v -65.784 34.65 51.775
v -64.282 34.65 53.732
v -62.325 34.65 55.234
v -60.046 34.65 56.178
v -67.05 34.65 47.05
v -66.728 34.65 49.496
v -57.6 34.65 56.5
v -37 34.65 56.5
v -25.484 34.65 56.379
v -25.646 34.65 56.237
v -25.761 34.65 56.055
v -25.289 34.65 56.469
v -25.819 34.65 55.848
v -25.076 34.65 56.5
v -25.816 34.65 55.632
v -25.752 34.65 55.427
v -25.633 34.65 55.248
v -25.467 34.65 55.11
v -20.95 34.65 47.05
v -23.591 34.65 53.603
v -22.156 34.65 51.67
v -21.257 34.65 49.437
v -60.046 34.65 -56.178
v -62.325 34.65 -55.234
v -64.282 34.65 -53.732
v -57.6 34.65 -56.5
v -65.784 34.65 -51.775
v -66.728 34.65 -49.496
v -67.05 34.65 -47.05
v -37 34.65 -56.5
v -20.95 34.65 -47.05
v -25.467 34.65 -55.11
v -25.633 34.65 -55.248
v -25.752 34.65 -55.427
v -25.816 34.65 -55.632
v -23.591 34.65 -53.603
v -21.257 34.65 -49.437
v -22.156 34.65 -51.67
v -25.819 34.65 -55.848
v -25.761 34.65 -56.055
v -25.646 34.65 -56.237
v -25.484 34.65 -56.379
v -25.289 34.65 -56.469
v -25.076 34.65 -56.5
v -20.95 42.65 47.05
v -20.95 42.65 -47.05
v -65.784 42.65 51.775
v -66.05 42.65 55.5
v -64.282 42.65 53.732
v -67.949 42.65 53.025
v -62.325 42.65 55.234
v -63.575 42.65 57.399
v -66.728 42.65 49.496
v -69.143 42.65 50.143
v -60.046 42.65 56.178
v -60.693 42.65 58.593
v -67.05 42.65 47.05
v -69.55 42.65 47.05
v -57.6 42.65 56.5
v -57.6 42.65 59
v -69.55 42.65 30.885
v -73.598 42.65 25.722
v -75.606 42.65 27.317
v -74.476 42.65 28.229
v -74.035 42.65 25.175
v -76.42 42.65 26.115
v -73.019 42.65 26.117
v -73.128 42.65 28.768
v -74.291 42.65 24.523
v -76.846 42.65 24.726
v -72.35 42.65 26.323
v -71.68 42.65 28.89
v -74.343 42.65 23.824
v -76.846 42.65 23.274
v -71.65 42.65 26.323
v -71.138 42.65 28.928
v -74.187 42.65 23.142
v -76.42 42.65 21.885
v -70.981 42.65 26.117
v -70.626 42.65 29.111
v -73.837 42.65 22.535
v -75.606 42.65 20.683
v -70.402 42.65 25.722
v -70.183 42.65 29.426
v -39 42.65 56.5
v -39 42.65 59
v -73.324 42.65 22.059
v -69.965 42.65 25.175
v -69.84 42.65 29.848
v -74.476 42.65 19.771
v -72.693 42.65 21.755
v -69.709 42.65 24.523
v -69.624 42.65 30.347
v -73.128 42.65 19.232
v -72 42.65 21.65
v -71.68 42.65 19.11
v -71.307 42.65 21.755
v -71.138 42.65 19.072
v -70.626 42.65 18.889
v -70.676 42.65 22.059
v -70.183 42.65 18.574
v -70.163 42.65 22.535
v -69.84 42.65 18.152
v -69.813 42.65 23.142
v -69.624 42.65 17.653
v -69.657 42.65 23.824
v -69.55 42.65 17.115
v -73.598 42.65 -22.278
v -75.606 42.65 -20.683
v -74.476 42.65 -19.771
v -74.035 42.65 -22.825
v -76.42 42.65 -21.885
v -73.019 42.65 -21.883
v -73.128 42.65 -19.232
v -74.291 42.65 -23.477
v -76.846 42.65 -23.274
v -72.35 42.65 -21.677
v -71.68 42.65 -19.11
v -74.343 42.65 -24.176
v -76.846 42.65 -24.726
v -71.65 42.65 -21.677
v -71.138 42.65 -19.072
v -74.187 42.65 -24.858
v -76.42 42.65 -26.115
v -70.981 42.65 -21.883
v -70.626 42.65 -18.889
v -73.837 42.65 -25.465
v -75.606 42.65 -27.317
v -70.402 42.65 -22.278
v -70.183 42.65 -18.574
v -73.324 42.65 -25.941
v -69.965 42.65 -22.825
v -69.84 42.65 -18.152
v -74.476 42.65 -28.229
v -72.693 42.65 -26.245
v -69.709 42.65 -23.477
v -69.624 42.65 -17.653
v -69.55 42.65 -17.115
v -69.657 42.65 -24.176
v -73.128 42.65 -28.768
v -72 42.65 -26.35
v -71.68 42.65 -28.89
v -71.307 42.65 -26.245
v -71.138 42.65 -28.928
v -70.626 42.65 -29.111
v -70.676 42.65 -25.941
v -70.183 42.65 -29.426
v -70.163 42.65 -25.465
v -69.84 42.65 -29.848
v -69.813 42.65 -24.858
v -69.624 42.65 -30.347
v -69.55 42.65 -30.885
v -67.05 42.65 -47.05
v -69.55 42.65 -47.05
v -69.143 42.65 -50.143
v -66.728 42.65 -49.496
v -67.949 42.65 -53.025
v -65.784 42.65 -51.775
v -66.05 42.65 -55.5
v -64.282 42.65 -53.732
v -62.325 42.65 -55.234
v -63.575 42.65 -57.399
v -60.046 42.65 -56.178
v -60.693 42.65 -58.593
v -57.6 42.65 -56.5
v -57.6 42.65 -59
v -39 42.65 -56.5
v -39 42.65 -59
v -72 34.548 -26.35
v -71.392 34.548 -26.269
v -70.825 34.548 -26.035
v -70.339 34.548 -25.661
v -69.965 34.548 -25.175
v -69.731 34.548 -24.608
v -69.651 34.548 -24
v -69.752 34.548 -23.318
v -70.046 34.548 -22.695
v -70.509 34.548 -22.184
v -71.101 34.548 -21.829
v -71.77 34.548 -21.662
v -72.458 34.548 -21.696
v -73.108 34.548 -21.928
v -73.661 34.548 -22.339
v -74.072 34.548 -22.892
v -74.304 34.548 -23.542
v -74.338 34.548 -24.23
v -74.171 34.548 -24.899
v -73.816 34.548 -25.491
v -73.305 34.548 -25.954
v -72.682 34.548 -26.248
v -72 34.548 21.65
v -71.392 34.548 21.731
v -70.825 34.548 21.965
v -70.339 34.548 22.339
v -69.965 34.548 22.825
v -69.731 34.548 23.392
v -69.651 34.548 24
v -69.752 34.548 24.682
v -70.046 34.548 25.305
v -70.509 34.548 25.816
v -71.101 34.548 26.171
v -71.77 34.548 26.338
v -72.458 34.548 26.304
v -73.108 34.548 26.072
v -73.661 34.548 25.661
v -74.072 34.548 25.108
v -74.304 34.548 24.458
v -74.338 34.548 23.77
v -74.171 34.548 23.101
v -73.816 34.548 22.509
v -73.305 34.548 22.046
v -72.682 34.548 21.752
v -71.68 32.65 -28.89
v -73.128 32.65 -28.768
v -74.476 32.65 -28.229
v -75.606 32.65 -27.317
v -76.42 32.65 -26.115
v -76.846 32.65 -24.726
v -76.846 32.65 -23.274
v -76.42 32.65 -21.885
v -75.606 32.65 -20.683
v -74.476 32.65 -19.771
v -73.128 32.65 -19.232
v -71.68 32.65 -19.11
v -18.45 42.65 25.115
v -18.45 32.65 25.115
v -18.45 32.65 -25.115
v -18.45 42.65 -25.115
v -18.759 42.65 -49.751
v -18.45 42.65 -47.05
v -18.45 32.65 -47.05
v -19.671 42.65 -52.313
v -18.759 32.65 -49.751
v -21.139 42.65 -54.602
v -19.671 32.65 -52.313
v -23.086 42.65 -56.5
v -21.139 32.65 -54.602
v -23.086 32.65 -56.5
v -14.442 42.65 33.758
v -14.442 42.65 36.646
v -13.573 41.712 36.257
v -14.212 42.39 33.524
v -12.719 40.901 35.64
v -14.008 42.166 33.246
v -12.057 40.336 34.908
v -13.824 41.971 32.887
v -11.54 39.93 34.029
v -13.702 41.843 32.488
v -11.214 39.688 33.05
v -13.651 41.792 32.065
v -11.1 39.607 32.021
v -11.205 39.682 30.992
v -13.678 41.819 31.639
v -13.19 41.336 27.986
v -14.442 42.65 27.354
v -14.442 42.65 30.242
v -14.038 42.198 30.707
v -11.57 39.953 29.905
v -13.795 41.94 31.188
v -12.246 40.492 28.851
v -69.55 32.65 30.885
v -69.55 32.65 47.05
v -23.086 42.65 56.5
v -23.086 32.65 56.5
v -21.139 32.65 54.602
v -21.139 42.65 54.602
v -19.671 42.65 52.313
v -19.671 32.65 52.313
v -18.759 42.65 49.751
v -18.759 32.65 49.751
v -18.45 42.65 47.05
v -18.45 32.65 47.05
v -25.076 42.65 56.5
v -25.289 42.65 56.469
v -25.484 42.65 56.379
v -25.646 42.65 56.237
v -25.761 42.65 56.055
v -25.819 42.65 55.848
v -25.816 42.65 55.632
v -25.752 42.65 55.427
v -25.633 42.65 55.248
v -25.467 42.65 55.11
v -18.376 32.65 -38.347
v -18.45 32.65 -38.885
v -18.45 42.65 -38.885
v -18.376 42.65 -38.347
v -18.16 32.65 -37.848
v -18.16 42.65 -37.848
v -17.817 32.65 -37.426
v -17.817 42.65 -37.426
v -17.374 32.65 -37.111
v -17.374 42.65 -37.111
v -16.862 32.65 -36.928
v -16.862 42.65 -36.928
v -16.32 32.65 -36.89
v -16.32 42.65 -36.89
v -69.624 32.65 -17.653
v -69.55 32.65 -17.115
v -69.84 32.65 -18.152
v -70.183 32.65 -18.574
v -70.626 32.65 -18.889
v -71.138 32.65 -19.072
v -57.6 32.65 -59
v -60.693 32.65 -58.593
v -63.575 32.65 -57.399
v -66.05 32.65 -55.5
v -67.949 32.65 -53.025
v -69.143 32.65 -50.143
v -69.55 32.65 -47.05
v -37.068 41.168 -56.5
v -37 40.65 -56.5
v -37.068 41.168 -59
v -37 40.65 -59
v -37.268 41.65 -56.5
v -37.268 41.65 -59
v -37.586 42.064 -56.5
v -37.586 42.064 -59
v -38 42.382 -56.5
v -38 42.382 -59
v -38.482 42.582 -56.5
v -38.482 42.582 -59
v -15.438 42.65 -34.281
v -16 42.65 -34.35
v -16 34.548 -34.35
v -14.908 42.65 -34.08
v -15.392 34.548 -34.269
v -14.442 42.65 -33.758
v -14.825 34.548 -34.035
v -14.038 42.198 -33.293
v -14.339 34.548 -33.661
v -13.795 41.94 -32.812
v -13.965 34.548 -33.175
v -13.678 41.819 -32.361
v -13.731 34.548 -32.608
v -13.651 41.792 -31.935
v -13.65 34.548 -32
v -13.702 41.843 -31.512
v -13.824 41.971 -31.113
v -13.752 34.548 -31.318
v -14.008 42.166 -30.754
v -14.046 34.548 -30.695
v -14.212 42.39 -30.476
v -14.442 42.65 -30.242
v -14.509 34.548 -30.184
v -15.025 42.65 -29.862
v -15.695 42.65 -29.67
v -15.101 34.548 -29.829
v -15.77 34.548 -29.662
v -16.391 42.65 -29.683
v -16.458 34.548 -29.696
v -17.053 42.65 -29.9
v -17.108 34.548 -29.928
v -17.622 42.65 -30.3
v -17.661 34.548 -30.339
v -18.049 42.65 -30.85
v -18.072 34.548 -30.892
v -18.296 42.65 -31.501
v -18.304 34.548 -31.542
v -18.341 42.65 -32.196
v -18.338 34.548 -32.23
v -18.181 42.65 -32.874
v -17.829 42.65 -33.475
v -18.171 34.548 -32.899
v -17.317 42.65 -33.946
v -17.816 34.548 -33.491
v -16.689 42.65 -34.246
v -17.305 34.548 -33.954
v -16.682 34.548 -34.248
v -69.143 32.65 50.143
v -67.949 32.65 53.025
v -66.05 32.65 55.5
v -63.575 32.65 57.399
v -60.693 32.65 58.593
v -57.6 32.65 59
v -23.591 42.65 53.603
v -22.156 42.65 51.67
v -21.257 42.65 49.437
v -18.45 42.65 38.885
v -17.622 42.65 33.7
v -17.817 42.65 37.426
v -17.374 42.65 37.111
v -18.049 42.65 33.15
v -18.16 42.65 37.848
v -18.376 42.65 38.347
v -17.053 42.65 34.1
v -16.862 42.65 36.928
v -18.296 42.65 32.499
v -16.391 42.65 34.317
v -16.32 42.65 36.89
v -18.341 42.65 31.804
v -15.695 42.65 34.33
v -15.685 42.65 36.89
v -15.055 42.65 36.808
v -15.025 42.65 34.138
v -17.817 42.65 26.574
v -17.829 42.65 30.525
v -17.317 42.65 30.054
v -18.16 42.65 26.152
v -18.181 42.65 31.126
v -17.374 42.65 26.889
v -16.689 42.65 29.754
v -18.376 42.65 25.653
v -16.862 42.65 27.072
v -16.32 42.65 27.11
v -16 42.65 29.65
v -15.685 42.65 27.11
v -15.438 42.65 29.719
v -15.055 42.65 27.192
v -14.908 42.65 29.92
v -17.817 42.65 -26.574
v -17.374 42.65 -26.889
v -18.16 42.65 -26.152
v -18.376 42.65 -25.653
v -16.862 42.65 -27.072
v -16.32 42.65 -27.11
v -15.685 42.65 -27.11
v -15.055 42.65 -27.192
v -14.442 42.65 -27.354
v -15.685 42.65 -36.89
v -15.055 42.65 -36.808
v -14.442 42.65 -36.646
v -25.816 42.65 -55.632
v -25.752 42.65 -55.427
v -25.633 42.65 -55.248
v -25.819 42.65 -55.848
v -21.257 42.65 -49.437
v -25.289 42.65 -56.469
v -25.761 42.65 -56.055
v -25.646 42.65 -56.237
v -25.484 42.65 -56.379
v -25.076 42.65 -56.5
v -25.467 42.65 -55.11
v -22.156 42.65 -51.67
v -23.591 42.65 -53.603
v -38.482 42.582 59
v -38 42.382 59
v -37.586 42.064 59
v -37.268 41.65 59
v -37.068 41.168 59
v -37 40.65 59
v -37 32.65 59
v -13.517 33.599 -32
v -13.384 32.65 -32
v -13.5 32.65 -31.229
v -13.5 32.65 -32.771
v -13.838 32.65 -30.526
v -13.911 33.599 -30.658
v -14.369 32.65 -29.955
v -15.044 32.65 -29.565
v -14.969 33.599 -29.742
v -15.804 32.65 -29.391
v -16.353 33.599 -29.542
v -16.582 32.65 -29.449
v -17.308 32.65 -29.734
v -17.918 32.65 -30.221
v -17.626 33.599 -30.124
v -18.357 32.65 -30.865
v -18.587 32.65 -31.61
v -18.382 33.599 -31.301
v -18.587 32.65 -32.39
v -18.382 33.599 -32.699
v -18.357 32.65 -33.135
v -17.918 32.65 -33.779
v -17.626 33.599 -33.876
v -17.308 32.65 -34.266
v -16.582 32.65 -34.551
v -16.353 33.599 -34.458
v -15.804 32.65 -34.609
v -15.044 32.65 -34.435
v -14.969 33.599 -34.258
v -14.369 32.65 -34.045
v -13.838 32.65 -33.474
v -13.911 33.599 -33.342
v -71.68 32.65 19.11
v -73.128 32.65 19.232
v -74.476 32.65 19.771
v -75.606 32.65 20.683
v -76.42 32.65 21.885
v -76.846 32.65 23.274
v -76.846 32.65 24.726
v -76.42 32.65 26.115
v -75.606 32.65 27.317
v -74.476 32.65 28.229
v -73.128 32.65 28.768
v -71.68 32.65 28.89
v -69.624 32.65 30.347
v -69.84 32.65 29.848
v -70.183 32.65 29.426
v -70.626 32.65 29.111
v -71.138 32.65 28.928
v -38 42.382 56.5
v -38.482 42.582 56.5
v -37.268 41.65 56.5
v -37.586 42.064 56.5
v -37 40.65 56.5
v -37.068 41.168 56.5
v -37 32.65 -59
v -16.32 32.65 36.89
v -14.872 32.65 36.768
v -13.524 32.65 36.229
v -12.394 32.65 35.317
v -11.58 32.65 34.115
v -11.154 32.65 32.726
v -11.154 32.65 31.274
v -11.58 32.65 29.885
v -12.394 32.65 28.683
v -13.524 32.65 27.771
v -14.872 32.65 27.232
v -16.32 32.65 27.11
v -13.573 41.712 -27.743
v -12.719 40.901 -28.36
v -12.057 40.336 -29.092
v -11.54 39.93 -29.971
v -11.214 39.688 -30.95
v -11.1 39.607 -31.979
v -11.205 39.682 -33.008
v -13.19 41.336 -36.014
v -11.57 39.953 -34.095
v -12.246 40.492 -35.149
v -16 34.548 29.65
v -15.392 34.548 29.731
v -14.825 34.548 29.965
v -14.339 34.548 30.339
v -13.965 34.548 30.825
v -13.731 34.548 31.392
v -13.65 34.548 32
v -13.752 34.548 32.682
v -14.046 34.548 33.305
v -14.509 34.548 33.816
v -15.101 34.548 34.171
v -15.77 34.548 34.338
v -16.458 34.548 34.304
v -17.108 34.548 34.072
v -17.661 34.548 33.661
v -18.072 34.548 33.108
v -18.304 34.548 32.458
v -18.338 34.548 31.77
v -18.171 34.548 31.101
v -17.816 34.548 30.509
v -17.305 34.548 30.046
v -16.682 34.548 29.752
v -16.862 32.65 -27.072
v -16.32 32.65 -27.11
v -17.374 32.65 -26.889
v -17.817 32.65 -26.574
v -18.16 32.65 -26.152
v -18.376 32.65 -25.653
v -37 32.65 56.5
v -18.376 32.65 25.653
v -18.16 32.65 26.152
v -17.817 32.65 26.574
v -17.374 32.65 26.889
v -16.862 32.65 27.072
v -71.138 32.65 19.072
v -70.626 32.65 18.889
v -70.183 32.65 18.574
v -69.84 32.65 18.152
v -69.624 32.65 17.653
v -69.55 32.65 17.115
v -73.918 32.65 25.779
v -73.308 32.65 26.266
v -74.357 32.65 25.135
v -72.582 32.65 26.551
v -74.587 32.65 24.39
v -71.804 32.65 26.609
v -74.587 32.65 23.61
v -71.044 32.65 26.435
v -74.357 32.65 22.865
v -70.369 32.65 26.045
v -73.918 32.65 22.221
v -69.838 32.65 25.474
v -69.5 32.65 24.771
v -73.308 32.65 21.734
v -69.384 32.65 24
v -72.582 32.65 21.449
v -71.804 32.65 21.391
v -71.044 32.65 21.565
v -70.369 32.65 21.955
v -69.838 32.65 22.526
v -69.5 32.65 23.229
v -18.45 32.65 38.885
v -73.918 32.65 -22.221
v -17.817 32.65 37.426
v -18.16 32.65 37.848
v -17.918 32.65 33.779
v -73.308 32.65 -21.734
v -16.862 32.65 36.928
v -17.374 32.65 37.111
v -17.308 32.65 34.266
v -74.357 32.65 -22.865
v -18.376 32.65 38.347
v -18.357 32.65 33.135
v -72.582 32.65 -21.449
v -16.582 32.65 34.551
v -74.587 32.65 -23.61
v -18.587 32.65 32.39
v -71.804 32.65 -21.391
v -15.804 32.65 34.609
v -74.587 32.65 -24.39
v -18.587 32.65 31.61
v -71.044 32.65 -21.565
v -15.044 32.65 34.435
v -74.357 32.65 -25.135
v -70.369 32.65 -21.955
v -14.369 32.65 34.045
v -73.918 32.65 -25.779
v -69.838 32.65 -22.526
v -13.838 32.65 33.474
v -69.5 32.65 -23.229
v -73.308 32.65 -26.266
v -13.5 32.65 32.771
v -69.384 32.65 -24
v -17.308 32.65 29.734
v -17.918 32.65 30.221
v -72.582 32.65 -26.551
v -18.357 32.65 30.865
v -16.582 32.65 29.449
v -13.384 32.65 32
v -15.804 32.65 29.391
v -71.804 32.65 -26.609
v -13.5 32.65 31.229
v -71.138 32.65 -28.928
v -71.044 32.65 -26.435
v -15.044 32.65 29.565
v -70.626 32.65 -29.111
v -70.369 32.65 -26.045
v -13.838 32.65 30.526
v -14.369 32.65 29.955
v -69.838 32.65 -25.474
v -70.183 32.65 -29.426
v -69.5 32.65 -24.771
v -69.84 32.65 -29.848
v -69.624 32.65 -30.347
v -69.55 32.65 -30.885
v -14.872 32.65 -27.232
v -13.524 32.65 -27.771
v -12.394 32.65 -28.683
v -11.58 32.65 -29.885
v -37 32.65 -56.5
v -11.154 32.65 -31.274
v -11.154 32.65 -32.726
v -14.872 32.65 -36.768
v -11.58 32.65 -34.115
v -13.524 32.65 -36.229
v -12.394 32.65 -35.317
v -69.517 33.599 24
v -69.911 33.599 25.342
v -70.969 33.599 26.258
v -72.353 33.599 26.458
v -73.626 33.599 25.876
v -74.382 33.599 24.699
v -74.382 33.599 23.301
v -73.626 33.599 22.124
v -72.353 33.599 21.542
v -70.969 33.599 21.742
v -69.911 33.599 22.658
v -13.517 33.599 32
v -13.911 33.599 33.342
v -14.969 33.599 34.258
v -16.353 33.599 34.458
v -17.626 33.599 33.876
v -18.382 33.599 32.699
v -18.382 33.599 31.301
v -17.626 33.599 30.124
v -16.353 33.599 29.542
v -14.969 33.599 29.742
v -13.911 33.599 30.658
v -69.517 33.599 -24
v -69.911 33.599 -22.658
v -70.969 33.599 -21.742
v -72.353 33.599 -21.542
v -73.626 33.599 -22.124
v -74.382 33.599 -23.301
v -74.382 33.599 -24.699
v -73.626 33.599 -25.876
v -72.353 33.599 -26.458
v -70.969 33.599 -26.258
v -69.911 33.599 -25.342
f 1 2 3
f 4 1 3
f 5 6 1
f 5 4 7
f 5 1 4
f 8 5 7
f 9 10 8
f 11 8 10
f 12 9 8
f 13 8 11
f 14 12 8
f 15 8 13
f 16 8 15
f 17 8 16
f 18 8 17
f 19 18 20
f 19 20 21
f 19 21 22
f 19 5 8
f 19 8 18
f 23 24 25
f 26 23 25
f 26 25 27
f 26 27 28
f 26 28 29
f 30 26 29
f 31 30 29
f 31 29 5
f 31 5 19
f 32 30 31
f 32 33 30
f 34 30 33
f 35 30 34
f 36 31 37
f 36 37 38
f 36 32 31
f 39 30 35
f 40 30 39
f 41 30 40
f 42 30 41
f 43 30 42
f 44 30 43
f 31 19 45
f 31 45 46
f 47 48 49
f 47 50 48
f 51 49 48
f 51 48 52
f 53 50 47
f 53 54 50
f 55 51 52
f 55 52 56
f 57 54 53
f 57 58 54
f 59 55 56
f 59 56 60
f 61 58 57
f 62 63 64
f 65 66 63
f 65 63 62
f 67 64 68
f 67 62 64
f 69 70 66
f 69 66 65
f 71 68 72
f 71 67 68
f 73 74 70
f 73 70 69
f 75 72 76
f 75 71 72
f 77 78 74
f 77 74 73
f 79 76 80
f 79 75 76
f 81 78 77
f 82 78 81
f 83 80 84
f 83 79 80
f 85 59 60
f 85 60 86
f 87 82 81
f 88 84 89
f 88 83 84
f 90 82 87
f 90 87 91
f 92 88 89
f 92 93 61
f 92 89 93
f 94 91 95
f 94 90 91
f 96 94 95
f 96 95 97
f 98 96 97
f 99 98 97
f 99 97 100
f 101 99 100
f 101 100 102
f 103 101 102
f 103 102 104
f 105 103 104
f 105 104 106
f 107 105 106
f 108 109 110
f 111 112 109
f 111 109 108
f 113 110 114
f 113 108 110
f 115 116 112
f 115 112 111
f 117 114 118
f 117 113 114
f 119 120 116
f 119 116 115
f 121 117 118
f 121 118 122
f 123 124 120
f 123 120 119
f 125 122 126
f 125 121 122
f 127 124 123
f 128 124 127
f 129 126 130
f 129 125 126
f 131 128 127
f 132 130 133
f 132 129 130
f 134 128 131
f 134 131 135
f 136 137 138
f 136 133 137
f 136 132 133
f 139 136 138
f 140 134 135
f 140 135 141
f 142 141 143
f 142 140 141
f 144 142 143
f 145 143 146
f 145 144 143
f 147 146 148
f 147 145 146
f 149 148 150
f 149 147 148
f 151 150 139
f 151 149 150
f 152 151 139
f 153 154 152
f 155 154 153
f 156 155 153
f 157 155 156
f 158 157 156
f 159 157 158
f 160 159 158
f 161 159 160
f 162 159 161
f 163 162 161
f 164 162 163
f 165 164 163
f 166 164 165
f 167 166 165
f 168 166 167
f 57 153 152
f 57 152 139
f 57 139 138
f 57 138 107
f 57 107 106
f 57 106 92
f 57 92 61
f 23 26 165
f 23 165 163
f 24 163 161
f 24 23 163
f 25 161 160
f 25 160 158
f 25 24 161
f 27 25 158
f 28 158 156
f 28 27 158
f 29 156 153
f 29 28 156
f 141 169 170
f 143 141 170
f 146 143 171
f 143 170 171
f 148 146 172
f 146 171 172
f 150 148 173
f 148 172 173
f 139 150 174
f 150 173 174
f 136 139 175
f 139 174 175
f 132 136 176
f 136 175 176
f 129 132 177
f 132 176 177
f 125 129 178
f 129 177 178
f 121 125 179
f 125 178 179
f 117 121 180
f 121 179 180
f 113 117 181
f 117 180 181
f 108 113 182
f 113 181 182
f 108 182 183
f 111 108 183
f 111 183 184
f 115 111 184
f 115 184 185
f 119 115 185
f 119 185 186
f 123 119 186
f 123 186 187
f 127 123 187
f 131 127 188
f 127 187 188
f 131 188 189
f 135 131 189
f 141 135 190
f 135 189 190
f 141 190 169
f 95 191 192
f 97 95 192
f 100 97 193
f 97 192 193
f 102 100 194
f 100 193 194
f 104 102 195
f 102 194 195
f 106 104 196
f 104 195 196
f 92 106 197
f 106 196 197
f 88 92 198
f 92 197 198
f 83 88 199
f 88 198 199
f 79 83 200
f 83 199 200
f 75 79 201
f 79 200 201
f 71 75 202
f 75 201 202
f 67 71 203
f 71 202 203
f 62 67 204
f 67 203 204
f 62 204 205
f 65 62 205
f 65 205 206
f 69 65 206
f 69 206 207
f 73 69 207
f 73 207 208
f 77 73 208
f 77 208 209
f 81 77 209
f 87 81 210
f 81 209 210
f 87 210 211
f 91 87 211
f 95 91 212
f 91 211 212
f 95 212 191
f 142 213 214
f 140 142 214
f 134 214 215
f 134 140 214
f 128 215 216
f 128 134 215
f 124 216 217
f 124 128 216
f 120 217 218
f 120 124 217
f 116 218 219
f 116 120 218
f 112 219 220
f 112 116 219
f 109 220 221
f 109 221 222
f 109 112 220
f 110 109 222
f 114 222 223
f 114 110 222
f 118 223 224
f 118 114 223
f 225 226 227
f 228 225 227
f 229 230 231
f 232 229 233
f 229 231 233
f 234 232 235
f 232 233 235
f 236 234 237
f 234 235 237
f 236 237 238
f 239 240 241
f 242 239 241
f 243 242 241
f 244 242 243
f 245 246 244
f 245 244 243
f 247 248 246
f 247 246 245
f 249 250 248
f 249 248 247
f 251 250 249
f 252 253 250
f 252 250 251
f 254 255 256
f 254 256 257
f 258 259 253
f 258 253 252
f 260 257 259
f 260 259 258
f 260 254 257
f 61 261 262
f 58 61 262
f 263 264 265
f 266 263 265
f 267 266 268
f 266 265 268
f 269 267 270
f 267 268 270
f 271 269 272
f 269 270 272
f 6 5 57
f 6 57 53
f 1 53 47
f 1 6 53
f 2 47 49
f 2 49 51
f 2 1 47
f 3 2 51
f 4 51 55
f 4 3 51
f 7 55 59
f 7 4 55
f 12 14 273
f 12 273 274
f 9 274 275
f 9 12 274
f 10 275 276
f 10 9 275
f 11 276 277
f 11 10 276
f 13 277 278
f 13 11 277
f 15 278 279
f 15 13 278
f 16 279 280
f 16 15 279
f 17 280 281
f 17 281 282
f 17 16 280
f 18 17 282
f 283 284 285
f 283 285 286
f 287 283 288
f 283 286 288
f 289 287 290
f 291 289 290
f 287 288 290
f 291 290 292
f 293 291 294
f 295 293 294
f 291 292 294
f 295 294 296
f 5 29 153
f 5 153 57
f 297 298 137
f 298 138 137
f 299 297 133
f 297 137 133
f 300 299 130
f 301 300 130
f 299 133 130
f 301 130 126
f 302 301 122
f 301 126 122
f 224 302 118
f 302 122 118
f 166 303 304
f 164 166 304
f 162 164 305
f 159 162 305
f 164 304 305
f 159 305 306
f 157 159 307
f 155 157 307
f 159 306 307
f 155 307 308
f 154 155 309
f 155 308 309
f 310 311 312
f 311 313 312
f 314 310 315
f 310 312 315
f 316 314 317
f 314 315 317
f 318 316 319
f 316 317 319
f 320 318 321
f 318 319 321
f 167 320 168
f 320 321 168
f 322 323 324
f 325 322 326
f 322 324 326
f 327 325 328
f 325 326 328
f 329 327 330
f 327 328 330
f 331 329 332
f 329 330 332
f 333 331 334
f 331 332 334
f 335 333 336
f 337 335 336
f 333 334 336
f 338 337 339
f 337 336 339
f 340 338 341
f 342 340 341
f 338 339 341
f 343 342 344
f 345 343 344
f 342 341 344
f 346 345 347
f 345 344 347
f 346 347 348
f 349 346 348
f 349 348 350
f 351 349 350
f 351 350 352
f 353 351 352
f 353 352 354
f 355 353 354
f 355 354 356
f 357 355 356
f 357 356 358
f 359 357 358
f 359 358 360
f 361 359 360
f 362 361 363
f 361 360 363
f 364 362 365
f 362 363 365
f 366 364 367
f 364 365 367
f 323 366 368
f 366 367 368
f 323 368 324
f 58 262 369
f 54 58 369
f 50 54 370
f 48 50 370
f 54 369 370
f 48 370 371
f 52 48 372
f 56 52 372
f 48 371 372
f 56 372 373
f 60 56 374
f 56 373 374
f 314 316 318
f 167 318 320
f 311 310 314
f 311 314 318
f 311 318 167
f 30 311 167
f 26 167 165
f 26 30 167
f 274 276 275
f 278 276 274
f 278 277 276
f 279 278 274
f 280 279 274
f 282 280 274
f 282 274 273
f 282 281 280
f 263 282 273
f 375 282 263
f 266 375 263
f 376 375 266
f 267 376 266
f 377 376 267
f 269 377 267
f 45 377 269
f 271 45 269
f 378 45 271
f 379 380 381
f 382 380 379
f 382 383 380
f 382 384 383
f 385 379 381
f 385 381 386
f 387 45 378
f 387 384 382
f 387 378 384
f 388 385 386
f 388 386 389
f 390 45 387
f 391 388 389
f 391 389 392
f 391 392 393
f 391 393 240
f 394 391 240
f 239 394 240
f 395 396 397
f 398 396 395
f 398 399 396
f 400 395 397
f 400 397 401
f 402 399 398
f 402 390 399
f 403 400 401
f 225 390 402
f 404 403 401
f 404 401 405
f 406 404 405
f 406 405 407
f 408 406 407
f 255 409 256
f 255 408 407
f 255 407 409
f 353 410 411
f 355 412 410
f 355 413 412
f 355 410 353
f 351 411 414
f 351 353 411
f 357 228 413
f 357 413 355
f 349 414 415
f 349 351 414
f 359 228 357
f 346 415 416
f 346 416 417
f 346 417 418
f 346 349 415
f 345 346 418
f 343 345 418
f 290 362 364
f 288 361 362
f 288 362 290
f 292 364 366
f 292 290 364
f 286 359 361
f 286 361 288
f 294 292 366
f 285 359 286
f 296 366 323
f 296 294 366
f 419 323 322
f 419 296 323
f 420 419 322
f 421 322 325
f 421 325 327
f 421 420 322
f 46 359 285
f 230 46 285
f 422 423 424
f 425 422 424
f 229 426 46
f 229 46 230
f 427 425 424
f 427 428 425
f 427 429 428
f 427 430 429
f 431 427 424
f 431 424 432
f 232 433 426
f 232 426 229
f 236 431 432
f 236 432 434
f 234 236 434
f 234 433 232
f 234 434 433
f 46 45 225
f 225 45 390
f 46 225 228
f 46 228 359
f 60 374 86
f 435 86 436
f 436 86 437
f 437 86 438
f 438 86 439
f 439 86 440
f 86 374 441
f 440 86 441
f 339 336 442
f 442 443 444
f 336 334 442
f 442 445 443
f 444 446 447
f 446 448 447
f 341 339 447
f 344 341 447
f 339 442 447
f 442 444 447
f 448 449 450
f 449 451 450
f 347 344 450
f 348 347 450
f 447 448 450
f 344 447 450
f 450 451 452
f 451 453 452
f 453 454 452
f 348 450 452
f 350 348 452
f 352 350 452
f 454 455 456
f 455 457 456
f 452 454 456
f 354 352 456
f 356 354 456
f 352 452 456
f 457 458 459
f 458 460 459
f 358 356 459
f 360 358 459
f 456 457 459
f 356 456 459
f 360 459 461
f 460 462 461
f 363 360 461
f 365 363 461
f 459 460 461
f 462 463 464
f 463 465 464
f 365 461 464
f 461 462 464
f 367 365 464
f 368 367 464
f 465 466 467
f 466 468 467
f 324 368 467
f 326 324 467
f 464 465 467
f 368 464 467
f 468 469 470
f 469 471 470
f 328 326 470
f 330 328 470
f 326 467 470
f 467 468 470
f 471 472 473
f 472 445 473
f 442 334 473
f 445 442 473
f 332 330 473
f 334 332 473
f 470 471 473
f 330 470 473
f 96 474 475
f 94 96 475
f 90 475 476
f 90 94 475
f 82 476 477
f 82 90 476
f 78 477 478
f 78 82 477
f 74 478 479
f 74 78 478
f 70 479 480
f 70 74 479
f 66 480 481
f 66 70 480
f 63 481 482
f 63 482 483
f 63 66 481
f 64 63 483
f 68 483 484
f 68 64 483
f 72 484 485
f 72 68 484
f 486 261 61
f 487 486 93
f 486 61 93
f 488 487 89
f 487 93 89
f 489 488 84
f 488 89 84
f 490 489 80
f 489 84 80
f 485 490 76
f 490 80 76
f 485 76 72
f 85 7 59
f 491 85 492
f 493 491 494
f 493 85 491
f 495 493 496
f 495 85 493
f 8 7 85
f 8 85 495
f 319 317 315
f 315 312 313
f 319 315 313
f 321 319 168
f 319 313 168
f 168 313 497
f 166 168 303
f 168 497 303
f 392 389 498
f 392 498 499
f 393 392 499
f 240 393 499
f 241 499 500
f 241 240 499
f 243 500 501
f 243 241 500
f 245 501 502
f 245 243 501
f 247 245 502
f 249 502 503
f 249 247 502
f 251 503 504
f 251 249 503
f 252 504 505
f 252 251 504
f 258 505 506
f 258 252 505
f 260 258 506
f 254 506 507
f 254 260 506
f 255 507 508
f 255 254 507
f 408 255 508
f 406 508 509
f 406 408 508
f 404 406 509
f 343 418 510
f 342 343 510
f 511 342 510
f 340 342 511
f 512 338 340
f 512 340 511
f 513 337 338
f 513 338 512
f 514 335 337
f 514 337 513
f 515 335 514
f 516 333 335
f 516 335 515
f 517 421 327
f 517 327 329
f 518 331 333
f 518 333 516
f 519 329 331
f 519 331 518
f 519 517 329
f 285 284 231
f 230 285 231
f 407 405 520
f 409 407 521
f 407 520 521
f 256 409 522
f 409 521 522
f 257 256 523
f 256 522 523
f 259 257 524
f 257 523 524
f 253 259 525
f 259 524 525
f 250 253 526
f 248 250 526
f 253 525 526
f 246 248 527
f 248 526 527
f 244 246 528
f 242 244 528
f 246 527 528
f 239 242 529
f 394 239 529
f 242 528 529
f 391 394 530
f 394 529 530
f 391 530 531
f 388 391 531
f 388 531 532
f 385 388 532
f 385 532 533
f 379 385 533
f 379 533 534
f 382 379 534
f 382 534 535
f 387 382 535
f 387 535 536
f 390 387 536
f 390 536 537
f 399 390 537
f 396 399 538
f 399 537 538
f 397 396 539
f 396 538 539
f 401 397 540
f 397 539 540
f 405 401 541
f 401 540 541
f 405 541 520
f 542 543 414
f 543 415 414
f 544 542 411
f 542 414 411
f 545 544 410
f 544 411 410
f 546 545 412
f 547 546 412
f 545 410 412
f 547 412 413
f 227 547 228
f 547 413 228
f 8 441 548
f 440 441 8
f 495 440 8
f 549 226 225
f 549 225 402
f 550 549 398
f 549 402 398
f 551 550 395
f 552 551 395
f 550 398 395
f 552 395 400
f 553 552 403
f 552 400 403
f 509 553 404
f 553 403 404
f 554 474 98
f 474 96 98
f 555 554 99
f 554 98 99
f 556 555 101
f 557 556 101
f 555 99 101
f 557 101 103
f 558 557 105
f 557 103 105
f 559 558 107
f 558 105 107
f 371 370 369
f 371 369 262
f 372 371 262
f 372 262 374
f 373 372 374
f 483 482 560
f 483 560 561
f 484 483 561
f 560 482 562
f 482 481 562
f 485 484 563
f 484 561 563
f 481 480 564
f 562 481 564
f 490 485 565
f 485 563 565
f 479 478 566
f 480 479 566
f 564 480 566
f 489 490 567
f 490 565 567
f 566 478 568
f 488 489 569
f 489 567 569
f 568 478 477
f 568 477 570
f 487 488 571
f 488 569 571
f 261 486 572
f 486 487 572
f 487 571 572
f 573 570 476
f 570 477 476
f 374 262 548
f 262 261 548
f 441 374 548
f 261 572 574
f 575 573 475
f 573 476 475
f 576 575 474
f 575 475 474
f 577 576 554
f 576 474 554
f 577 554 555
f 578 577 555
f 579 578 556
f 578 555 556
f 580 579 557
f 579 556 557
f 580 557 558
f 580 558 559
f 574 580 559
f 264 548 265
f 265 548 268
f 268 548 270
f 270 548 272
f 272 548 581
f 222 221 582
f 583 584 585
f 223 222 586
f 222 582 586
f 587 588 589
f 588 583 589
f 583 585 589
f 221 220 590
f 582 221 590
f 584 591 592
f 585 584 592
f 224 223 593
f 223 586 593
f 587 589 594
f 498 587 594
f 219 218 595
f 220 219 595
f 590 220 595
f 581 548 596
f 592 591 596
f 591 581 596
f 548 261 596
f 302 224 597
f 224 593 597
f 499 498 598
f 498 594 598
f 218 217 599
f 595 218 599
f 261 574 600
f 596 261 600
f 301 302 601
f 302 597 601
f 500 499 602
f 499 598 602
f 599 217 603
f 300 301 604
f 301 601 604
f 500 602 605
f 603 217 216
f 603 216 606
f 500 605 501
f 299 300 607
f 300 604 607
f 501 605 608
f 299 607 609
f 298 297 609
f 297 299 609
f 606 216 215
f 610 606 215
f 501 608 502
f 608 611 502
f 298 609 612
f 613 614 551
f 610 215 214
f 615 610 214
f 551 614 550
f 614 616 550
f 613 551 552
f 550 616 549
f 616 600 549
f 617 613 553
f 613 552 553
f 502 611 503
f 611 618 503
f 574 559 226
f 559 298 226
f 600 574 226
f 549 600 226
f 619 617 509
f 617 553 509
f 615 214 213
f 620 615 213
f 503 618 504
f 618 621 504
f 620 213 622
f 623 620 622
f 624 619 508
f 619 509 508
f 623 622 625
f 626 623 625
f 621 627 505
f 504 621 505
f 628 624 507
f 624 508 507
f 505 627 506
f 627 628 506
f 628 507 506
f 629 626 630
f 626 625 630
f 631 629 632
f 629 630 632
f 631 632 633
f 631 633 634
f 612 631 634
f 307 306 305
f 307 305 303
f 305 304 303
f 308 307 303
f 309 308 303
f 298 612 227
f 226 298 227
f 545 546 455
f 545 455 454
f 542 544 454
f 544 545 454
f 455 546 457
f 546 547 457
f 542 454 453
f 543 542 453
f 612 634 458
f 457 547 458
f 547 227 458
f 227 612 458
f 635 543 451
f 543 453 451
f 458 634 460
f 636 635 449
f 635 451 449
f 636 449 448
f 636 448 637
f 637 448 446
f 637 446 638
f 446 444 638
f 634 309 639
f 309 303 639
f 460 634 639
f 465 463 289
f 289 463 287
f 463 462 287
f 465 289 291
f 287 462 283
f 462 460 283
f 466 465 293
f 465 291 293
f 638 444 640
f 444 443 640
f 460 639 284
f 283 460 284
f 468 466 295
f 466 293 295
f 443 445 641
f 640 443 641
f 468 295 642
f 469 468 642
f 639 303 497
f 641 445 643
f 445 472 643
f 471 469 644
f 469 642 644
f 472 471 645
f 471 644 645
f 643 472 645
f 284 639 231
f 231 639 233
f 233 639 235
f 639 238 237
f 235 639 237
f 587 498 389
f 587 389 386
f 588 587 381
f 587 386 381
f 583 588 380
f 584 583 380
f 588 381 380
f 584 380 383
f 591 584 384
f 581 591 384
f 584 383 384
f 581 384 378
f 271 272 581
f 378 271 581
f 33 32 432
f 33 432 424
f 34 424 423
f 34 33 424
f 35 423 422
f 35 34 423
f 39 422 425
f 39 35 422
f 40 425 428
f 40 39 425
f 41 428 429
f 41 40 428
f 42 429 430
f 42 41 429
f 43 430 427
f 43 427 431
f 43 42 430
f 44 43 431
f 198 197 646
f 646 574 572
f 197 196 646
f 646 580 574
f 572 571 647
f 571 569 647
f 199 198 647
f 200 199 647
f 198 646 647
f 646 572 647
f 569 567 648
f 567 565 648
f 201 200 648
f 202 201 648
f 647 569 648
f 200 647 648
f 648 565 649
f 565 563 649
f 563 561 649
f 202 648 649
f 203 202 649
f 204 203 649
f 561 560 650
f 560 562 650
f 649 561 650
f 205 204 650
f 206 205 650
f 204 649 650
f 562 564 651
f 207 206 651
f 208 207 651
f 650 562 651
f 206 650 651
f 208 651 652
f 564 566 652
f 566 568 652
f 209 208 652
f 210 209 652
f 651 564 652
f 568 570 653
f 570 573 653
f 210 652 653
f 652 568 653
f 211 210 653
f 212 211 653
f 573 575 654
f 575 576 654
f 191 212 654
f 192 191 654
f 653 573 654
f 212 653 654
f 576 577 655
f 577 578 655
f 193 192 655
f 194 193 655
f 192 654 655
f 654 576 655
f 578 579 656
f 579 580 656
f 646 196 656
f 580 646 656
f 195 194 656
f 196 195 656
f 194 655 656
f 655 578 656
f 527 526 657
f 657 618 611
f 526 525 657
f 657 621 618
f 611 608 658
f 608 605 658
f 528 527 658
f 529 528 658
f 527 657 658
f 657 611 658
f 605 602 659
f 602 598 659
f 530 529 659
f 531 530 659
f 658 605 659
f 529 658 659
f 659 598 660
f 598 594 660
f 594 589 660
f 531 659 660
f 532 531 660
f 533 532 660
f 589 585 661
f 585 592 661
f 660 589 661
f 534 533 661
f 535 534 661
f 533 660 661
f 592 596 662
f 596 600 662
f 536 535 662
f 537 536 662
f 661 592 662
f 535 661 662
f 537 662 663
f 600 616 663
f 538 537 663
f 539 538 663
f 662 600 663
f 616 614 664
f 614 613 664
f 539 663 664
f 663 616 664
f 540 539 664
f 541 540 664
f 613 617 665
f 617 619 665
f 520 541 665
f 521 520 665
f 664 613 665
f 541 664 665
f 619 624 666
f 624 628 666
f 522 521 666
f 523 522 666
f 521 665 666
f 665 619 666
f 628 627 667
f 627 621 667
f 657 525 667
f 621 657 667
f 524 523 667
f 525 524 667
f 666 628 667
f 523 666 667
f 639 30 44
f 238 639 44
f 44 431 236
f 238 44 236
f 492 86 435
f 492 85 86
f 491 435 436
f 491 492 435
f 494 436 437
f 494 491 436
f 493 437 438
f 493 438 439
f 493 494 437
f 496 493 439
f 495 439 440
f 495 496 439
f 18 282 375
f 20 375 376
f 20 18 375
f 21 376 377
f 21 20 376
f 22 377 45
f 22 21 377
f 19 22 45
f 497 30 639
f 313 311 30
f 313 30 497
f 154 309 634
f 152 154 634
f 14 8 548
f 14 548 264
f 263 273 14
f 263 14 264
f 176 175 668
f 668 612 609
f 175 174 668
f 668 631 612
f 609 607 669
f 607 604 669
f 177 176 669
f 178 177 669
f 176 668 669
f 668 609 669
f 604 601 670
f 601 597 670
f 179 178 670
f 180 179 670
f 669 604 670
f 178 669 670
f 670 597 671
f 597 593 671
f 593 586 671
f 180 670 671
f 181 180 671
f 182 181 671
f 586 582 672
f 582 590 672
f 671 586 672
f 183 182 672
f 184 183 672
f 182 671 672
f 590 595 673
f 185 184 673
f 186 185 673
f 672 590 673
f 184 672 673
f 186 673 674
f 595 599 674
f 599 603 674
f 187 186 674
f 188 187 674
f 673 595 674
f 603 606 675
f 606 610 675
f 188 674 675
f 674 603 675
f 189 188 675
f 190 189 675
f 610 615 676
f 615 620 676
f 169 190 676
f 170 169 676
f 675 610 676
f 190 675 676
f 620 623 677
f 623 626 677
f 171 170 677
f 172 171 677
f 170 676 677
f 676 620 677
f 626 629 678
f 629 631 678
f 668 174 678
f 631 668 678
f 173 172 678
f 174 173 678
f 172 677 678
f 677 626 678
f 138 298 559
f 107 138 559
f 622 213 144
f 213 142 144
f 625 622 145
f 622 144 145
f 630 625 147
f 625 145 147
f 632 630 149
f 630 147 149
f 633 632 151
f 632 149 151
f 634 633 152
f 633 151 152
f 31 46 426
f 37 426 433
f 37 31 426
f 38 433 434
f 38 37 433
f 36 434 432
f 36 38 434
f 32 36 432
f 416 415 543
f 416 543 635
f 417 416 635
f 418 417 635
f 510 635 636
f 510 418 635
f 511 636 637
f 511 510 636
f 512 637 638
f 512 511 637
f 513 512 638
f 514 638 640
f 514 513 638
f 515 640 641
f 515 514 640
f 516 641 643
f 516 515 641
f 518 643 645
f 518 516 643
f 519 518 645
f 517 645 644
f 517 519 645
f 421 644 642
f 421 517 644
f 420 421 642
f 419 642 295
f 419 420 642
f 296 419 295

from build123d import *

# Parameters (mm, degrees)
EXTRUDE_THIN1_DEPTH          = 10
BOSS_EXTRUDE1_DEPTH          = 2
SKETCH2_W                    = 25.834060226
SKETCH2_H                    = 7.264687176
SKETCH2_W_2                  = 26.707196626
SKETCH2_H_2                  = 6.244092899
CUT_EXTRUDE1_DEPTH           = 92.75076294
SKETCH3_R                    = 4.9
BOSS_EXTRUDE2_DEPTH          = 10
FILLET1_START                = 34.65
FILLET1_DEPTH                = 9.35
FILLET2_R                    = 2
CUT_EXTRUDE2_DEPTH           = 106.894440364
CUT_EXTRUDE2_DEPTH_BACK      = 106.894440364
SKETCH5_R                    = 19.1
SKETCH6_R                    = 2.6162
CUT_EXTRUDE3_DEPTH           = 5
CUT_EXTRUDE3_DRAFT           = -8
CUT_EXTRUDE3_PROFILE_2_DEPTH = 5
CUT_EXTRUDE3_PROFILE_2_DRAFT = -8
CUT_EXTRUDE3_PROFILE_3_DEPTH = 5
CUT_EXTRUDE3_PROFILE_3_DRAFT = -8
CUT_EXTRUDE3_PROFILE_4_DEPTH = 5
CUT_EXTRUDE3_PROFILE_4_DRAFT = -8
SKETCH7_R                    = 2.3495
CUT_EXTRUDE4_DEPTH           = 98.440289419


with BuildPart() as part:
    # Sketch1 → Extrude-Thin1 (new body)
    with BuildSketch(Plane(origin=(0, 32.65, 0), x_dir=(1, 0, 0), z_dir=(0, 1, 0))):
        with BuildLine():
            Line((-69.55, 47.05), (-69.55, -47.05))
            ThreePointArc((-69.55, -47.05), (-66.049926035, -55.499926035), (-57.6, -59))
            Line((-57.6, -59), (-30.4, -59))
            ThreePointArc((-30.4, -59), (-21.950073965, -55.499926035), (-18.45, -47.05))
            Line((-18.45, -47.05), (-18.45, 47.05))
            ThreePointArc((-18.45, 47.05), (-21.950073965, 55.499926035), (-30.4, 59))
            Line((-30.4, 59), (-57.6, 59))
            ThreePointArc((-57.6, 59), (-66.049926035, 55.499926035), (-69.55, 47.05))
        make_face()
        with BuildLine():
            Line((-67.05, 47.05), (-67.05, -47.05))
            ThreePointArc((-67.05, -47.05), (-64.282159082, -53.732159082), (-57.6, -56.5))
            Line((-57.6, -56.5), (-30.4, -56.5))
            ThreePointArc((-30.4, -56.5), (-23.717840918, -53.732159082), (-20.95, -47.05))
            Line((-20.95, -47.05), (-20.95, 47.05))
            ThreePointArc((-20.95, 47.05), (-23.717840918, 53.732159082), (-30.4, 56.5))
            Line((-30.4, 56.5), (-57.6, 56.5))
            ThreePointArc((-57.6, 56.5), (-64.282159082, 53.732159082), (-67.05, 47.05))
        make_face(mode=Mode.SUBTRACT)
    extrude(amount=EXTRUDE_THIN1_DEPTH)

    # Sketch1<2> → Boss-Extrude1 (add)
    with BuildSketch(Plane(origin=(0, 32.65, 0), x_dir=(1, 0, 0), z_dir=(0, 1, 0))):
        with BuildLine():
            Line((-20.95, -47.05), (-20.95, 47.05))
            ThreePointArc((-20.95, 47.05), (-23.717840918, 53.732159082), (-30.4, 56.5))
            Line((-30.4, 56.5), (-57.6, 56.5))
            ThreePointArc((-57.6, 56.5), (-64.282159082, 53.732159082), (-67.05, 47.05))
            Line((-67.05, 47.05), (-67.05, -47.05))
            ThreePointArc((-67.05, -47.05), (-64.282159082, -53.732159082), (-57.6, -56.5))
            Line((-57.6, -56.5), (-30.4, -56.5))
            ThreePointArc((-30.4, -56.5), (-23.717840918, -53.732159082), (-20.95, -47.05))
        make_face()
    extrude(amount=BOSS_EXTRUDE1_DEPTH)

    # Sketch2 → Cut-Extrude1 (cut, through all)
    with BuildSketch(Plane(origin=(0, 42.65, 0), x_dir=(1, 0, 0), z_dir=(0, 1, 0))):
        with Locations((-24.082969887, 60.132343588)):
            Rectangle(SKETCH2_W, SKETCH2_H)
        with Locations((-23.646401687, -59.62204645)):
            Rectangle(SKETCH2_W_2, SKETCH2_H_2)
    extrude(amount=-CUT_EXTRUDE1_DEPTH, mode=Mode.SUBTRACT)

    # Sketch3 → Boss-Extrude2 (add)
    with BuildSketch(Plane(origin=(0, 42.65, 0), x_dir=(1, 0, 0), z_dir=(0, 1, 0))):
        with Locations((-72, -24)):
            Circle(SKETCH3_R)
        with Locations((-16, -32)):
            Circle(SKETCH3_R)
        with Locations((-16, 32)):
            Circle(SKETCH3_R)
        with Locations((-72, 24)):
            Circle(SKETCH3_R)
    extrude(amount=-BOSS_EXTRUDE2_DEPTH)

    # Fillet1: read off the stored shape, not the designer's step
    # Fillet1 outline → Fillet1 (cut)
    with BuildSketch(Plane(origin=(0, 0, 0), x_dir=(1, 0, 0), z_dir=(0, 1, 0)).offset(FILLET1_START)):
        with BuildLine():
            ThreePointArc((-30.4, 56.5), (-27.837508967, 56.145940837), (-25.467033475, 55.110294118))
            ThreePointArc((-25.467033475, 55.110294118), (-25.797428262, 55.953372305), (-25.075528195, 56.5))
            Line((-25.075528195, 56.5), (-30.4, 56.5))
        make_face()
        with BuildLine():
            Line((-30.4, -56.5), (-25.075528195, -56.5))
            ThreePointArc((-25.075528195, -56.5), (-25.797428262, -55.953372305), (-25.467033475, -55.110294118))
            ThreePointArc((-25.467033475, -55.110294118), (-27.837508967, -56.145940837), (-30.4, -56.5))
        make_face()
    extrude(amount=FILLET1_DEPTH, mode=Mode.SUBTRACT)

    # Fillet2
    fillet2_edges = [part.edges().sort_by_distance(p)[0] for p in [
        (-69.55, 37.65, 28.243524479),
        (-69.55, 37.65, 19.756475521),
        (-18.45, 37.65, 27.756475521),
        (-18.45, 37.65, 36.243524479),
        (-18.45, 37.65, -36.243524479),
        (-18.45, 37.65, -27.756475521),
        (-69.55, 37.65, -28.243524479),
        (-69.55, 37.65, -19.756475521),
        (-37, 42.65, -57.75),
        (-37, 42.65, 57.75),
    ]]
    fillet(fillet2_edges, radius=FILLET2_R)

    # Sketch5 → Cut-Extrude2 (cut, two sides: drawn at the far end of the back side and taken through both)
    with BuildSketch(Plane.XY.offset(-CUT_EXTRUDE2_DEPTH_BACK)):
        with Locations((0, 55.15)):
            Circle(SKETCH5_R)
    extrude(amount=CUT_EXTRUDE2_DEPTH + CUT_EXTRUDE2_DEPTH_BACK, mode=Mode.SUBTRACT)


with BuildPart() as cut_extrude3_tool:
    # Sketch6 → Cut-Extrude3 (with draft: the straight prism first)
    with BuildSketch(Plane.XZ.offset(-32.65)):
        with Locations((-72, 24)):
            Circle(SKETCH6_R)
    extrude(amount=-CUT_EXTRUDE3_DEPTH)
    # Cut-Extrude3: the draft: its side faces are tilted about the plane it starts from
    cut_extrude3_sides = [cut_extrude3_tool.faces().sort_by_distance(p)[0] for p in [
        (-74.6162, 35.15, 24),
    ]]
    draft(cut_extrude3_sides, Plane.XZ.offset(-32.65), CUT_EXTRUDE3_DRAFT)


with BuildPart() as part_1:
    add(part.part)

    # Cut-Extrude3: cut by cut_extrude3_tool
    add(cut_extrude3_tool.part, mode=Mode.SUBTRACT)


with BuildPart() as cut_extrude3_profile_2_tool:
    # Sketch6 → Cut-Extrude3 profile 2 (with draft: the straight prism first)
    with BuildSketch(Plane.XZ.offset(-32.65)):
        with Locations((-16, 32)):
            Circle(SKETCH6_R)
    extrude(amount=-CUT_EXTRUDE3_PROFILE_2_DEPTH)
    # Cut-Extrude3 profile 2: the draft: its side faces are tilted about the plane it starts from
    cut_extrude3_profile_2_sides = [cut_extrude3_profile_2_tool.faces().sort_by_distance(p)[0] for p in [
        (-18.6162, 35.15, 32),
    ]]
    draft(cut_extrude3_profile_2_sides, Plane.XZ.offset(-32.65), CUT_EXTRUDE3_PROFILE_2_DRAFT)


with BuildPart() as part_2:
    add(part_1.part)

    # Cut-Extrude3 profile 2: cut by cut_extrude3_profile_2_tool
    add(cut_extrude3_profile_2_tool.part, mode=Mode.SUBTRACT)


with BuildPart() as cut_extrude3_profile_3_tool:
    # Sketch6 → Cut-Extrude3 profile 3 (with draft: the straight prism first)
    with BuildSketch(Plane.XZ.offset(-32.65)):
        with Locations((-16, -32)):
            Circle(SKETCH6_R)
    extrude(amount=-CUT_EXTRUDE3_PROFILE_3_DEPTH)
    # Cut-Extrude3 profile 3: the draft: its side faces are tilted about the plane it starts from
    cut_extrude3_profile_3_sides = [cut_extrude3_profile_3_tool.faces().sort_by_distance(p)[0] for p in [
        (-18.6162, 35.15, -32),
    ]]
    draft(cut_extrude3_profile_3_sides, Plane.XZ.offset(-32.65), CUT_EXTRUDE3_PROFILE_3_DRAFT)


with BuildPart() as part_3:
    add(part_2.part)

    # Cut-Extrude3 profile 3: cut by cut_extrude3_profile_3_tool
    add(cut_extrude3_profile_3_tool.part, mode=Mode.SUBTRACT)


with BuildPart() as cut_extrude3_profile_4_tool:
    # Sketch6 → Cut-Extrude3 profile 4 (with draft: the straight prism first)
    with BuildSketch(Plane.XZ.offset(-32.65)):
        with Locations((-72, -24)):
            Circle(SKETCH6_R)
    extrude(amount=-CUT_EXTRUDE3_PROFILE_4_DEPTH)
    # Cut-Extrude3 profile 4: the draft: its side faces are tilted about the plane it starts from
    cut_extrude3_profile_4_sides = [cut_extrude3_profile_4_tool.faces().sort_by_distance(p)[0] for p in [
        (-74.6162, 35.15, -24),
    ]]
    draft(cut_extrude3_profile_4_sides, Plane.XZ.offset(-32.65), CUT_EXTRUDE3_PROFILE_4_DRAFT)


with BuildPart() as part_4:
    add(part_3.part)

    # Cut-Extrude3 profile 4: cut by cut_extrude3_profile_4_tool
    add(cut_extrude3_profile_4_tool.part, mode=Mode.SUBTRACT)

    # Sketch7 → Cut-Extrude4 (cut, through all)
    with BuildSketch(Plane.XZ.offset(-32.65)):
        with Locations(Location((-72, 24, 0), (0, 0, 270))):
            Circle(SKETCH7_R)
        with Locations(Location((-16, 32, 0), (0, 0, 270))):
            Circle(SKETCH7_R)
        with Locations(Location((-16, -32, 0), (0, 0, 270))):
            Circle(SKETCH7_R)
        with Locations(Location((-72, -24, 0), (0, 0, 270))):
            Circle(SKETCH7_R)
    extrude(amount=-CUT_EXTRUDE4_DEPTH, mode=Mode.SUBTRACT)


solid = part_4.part
